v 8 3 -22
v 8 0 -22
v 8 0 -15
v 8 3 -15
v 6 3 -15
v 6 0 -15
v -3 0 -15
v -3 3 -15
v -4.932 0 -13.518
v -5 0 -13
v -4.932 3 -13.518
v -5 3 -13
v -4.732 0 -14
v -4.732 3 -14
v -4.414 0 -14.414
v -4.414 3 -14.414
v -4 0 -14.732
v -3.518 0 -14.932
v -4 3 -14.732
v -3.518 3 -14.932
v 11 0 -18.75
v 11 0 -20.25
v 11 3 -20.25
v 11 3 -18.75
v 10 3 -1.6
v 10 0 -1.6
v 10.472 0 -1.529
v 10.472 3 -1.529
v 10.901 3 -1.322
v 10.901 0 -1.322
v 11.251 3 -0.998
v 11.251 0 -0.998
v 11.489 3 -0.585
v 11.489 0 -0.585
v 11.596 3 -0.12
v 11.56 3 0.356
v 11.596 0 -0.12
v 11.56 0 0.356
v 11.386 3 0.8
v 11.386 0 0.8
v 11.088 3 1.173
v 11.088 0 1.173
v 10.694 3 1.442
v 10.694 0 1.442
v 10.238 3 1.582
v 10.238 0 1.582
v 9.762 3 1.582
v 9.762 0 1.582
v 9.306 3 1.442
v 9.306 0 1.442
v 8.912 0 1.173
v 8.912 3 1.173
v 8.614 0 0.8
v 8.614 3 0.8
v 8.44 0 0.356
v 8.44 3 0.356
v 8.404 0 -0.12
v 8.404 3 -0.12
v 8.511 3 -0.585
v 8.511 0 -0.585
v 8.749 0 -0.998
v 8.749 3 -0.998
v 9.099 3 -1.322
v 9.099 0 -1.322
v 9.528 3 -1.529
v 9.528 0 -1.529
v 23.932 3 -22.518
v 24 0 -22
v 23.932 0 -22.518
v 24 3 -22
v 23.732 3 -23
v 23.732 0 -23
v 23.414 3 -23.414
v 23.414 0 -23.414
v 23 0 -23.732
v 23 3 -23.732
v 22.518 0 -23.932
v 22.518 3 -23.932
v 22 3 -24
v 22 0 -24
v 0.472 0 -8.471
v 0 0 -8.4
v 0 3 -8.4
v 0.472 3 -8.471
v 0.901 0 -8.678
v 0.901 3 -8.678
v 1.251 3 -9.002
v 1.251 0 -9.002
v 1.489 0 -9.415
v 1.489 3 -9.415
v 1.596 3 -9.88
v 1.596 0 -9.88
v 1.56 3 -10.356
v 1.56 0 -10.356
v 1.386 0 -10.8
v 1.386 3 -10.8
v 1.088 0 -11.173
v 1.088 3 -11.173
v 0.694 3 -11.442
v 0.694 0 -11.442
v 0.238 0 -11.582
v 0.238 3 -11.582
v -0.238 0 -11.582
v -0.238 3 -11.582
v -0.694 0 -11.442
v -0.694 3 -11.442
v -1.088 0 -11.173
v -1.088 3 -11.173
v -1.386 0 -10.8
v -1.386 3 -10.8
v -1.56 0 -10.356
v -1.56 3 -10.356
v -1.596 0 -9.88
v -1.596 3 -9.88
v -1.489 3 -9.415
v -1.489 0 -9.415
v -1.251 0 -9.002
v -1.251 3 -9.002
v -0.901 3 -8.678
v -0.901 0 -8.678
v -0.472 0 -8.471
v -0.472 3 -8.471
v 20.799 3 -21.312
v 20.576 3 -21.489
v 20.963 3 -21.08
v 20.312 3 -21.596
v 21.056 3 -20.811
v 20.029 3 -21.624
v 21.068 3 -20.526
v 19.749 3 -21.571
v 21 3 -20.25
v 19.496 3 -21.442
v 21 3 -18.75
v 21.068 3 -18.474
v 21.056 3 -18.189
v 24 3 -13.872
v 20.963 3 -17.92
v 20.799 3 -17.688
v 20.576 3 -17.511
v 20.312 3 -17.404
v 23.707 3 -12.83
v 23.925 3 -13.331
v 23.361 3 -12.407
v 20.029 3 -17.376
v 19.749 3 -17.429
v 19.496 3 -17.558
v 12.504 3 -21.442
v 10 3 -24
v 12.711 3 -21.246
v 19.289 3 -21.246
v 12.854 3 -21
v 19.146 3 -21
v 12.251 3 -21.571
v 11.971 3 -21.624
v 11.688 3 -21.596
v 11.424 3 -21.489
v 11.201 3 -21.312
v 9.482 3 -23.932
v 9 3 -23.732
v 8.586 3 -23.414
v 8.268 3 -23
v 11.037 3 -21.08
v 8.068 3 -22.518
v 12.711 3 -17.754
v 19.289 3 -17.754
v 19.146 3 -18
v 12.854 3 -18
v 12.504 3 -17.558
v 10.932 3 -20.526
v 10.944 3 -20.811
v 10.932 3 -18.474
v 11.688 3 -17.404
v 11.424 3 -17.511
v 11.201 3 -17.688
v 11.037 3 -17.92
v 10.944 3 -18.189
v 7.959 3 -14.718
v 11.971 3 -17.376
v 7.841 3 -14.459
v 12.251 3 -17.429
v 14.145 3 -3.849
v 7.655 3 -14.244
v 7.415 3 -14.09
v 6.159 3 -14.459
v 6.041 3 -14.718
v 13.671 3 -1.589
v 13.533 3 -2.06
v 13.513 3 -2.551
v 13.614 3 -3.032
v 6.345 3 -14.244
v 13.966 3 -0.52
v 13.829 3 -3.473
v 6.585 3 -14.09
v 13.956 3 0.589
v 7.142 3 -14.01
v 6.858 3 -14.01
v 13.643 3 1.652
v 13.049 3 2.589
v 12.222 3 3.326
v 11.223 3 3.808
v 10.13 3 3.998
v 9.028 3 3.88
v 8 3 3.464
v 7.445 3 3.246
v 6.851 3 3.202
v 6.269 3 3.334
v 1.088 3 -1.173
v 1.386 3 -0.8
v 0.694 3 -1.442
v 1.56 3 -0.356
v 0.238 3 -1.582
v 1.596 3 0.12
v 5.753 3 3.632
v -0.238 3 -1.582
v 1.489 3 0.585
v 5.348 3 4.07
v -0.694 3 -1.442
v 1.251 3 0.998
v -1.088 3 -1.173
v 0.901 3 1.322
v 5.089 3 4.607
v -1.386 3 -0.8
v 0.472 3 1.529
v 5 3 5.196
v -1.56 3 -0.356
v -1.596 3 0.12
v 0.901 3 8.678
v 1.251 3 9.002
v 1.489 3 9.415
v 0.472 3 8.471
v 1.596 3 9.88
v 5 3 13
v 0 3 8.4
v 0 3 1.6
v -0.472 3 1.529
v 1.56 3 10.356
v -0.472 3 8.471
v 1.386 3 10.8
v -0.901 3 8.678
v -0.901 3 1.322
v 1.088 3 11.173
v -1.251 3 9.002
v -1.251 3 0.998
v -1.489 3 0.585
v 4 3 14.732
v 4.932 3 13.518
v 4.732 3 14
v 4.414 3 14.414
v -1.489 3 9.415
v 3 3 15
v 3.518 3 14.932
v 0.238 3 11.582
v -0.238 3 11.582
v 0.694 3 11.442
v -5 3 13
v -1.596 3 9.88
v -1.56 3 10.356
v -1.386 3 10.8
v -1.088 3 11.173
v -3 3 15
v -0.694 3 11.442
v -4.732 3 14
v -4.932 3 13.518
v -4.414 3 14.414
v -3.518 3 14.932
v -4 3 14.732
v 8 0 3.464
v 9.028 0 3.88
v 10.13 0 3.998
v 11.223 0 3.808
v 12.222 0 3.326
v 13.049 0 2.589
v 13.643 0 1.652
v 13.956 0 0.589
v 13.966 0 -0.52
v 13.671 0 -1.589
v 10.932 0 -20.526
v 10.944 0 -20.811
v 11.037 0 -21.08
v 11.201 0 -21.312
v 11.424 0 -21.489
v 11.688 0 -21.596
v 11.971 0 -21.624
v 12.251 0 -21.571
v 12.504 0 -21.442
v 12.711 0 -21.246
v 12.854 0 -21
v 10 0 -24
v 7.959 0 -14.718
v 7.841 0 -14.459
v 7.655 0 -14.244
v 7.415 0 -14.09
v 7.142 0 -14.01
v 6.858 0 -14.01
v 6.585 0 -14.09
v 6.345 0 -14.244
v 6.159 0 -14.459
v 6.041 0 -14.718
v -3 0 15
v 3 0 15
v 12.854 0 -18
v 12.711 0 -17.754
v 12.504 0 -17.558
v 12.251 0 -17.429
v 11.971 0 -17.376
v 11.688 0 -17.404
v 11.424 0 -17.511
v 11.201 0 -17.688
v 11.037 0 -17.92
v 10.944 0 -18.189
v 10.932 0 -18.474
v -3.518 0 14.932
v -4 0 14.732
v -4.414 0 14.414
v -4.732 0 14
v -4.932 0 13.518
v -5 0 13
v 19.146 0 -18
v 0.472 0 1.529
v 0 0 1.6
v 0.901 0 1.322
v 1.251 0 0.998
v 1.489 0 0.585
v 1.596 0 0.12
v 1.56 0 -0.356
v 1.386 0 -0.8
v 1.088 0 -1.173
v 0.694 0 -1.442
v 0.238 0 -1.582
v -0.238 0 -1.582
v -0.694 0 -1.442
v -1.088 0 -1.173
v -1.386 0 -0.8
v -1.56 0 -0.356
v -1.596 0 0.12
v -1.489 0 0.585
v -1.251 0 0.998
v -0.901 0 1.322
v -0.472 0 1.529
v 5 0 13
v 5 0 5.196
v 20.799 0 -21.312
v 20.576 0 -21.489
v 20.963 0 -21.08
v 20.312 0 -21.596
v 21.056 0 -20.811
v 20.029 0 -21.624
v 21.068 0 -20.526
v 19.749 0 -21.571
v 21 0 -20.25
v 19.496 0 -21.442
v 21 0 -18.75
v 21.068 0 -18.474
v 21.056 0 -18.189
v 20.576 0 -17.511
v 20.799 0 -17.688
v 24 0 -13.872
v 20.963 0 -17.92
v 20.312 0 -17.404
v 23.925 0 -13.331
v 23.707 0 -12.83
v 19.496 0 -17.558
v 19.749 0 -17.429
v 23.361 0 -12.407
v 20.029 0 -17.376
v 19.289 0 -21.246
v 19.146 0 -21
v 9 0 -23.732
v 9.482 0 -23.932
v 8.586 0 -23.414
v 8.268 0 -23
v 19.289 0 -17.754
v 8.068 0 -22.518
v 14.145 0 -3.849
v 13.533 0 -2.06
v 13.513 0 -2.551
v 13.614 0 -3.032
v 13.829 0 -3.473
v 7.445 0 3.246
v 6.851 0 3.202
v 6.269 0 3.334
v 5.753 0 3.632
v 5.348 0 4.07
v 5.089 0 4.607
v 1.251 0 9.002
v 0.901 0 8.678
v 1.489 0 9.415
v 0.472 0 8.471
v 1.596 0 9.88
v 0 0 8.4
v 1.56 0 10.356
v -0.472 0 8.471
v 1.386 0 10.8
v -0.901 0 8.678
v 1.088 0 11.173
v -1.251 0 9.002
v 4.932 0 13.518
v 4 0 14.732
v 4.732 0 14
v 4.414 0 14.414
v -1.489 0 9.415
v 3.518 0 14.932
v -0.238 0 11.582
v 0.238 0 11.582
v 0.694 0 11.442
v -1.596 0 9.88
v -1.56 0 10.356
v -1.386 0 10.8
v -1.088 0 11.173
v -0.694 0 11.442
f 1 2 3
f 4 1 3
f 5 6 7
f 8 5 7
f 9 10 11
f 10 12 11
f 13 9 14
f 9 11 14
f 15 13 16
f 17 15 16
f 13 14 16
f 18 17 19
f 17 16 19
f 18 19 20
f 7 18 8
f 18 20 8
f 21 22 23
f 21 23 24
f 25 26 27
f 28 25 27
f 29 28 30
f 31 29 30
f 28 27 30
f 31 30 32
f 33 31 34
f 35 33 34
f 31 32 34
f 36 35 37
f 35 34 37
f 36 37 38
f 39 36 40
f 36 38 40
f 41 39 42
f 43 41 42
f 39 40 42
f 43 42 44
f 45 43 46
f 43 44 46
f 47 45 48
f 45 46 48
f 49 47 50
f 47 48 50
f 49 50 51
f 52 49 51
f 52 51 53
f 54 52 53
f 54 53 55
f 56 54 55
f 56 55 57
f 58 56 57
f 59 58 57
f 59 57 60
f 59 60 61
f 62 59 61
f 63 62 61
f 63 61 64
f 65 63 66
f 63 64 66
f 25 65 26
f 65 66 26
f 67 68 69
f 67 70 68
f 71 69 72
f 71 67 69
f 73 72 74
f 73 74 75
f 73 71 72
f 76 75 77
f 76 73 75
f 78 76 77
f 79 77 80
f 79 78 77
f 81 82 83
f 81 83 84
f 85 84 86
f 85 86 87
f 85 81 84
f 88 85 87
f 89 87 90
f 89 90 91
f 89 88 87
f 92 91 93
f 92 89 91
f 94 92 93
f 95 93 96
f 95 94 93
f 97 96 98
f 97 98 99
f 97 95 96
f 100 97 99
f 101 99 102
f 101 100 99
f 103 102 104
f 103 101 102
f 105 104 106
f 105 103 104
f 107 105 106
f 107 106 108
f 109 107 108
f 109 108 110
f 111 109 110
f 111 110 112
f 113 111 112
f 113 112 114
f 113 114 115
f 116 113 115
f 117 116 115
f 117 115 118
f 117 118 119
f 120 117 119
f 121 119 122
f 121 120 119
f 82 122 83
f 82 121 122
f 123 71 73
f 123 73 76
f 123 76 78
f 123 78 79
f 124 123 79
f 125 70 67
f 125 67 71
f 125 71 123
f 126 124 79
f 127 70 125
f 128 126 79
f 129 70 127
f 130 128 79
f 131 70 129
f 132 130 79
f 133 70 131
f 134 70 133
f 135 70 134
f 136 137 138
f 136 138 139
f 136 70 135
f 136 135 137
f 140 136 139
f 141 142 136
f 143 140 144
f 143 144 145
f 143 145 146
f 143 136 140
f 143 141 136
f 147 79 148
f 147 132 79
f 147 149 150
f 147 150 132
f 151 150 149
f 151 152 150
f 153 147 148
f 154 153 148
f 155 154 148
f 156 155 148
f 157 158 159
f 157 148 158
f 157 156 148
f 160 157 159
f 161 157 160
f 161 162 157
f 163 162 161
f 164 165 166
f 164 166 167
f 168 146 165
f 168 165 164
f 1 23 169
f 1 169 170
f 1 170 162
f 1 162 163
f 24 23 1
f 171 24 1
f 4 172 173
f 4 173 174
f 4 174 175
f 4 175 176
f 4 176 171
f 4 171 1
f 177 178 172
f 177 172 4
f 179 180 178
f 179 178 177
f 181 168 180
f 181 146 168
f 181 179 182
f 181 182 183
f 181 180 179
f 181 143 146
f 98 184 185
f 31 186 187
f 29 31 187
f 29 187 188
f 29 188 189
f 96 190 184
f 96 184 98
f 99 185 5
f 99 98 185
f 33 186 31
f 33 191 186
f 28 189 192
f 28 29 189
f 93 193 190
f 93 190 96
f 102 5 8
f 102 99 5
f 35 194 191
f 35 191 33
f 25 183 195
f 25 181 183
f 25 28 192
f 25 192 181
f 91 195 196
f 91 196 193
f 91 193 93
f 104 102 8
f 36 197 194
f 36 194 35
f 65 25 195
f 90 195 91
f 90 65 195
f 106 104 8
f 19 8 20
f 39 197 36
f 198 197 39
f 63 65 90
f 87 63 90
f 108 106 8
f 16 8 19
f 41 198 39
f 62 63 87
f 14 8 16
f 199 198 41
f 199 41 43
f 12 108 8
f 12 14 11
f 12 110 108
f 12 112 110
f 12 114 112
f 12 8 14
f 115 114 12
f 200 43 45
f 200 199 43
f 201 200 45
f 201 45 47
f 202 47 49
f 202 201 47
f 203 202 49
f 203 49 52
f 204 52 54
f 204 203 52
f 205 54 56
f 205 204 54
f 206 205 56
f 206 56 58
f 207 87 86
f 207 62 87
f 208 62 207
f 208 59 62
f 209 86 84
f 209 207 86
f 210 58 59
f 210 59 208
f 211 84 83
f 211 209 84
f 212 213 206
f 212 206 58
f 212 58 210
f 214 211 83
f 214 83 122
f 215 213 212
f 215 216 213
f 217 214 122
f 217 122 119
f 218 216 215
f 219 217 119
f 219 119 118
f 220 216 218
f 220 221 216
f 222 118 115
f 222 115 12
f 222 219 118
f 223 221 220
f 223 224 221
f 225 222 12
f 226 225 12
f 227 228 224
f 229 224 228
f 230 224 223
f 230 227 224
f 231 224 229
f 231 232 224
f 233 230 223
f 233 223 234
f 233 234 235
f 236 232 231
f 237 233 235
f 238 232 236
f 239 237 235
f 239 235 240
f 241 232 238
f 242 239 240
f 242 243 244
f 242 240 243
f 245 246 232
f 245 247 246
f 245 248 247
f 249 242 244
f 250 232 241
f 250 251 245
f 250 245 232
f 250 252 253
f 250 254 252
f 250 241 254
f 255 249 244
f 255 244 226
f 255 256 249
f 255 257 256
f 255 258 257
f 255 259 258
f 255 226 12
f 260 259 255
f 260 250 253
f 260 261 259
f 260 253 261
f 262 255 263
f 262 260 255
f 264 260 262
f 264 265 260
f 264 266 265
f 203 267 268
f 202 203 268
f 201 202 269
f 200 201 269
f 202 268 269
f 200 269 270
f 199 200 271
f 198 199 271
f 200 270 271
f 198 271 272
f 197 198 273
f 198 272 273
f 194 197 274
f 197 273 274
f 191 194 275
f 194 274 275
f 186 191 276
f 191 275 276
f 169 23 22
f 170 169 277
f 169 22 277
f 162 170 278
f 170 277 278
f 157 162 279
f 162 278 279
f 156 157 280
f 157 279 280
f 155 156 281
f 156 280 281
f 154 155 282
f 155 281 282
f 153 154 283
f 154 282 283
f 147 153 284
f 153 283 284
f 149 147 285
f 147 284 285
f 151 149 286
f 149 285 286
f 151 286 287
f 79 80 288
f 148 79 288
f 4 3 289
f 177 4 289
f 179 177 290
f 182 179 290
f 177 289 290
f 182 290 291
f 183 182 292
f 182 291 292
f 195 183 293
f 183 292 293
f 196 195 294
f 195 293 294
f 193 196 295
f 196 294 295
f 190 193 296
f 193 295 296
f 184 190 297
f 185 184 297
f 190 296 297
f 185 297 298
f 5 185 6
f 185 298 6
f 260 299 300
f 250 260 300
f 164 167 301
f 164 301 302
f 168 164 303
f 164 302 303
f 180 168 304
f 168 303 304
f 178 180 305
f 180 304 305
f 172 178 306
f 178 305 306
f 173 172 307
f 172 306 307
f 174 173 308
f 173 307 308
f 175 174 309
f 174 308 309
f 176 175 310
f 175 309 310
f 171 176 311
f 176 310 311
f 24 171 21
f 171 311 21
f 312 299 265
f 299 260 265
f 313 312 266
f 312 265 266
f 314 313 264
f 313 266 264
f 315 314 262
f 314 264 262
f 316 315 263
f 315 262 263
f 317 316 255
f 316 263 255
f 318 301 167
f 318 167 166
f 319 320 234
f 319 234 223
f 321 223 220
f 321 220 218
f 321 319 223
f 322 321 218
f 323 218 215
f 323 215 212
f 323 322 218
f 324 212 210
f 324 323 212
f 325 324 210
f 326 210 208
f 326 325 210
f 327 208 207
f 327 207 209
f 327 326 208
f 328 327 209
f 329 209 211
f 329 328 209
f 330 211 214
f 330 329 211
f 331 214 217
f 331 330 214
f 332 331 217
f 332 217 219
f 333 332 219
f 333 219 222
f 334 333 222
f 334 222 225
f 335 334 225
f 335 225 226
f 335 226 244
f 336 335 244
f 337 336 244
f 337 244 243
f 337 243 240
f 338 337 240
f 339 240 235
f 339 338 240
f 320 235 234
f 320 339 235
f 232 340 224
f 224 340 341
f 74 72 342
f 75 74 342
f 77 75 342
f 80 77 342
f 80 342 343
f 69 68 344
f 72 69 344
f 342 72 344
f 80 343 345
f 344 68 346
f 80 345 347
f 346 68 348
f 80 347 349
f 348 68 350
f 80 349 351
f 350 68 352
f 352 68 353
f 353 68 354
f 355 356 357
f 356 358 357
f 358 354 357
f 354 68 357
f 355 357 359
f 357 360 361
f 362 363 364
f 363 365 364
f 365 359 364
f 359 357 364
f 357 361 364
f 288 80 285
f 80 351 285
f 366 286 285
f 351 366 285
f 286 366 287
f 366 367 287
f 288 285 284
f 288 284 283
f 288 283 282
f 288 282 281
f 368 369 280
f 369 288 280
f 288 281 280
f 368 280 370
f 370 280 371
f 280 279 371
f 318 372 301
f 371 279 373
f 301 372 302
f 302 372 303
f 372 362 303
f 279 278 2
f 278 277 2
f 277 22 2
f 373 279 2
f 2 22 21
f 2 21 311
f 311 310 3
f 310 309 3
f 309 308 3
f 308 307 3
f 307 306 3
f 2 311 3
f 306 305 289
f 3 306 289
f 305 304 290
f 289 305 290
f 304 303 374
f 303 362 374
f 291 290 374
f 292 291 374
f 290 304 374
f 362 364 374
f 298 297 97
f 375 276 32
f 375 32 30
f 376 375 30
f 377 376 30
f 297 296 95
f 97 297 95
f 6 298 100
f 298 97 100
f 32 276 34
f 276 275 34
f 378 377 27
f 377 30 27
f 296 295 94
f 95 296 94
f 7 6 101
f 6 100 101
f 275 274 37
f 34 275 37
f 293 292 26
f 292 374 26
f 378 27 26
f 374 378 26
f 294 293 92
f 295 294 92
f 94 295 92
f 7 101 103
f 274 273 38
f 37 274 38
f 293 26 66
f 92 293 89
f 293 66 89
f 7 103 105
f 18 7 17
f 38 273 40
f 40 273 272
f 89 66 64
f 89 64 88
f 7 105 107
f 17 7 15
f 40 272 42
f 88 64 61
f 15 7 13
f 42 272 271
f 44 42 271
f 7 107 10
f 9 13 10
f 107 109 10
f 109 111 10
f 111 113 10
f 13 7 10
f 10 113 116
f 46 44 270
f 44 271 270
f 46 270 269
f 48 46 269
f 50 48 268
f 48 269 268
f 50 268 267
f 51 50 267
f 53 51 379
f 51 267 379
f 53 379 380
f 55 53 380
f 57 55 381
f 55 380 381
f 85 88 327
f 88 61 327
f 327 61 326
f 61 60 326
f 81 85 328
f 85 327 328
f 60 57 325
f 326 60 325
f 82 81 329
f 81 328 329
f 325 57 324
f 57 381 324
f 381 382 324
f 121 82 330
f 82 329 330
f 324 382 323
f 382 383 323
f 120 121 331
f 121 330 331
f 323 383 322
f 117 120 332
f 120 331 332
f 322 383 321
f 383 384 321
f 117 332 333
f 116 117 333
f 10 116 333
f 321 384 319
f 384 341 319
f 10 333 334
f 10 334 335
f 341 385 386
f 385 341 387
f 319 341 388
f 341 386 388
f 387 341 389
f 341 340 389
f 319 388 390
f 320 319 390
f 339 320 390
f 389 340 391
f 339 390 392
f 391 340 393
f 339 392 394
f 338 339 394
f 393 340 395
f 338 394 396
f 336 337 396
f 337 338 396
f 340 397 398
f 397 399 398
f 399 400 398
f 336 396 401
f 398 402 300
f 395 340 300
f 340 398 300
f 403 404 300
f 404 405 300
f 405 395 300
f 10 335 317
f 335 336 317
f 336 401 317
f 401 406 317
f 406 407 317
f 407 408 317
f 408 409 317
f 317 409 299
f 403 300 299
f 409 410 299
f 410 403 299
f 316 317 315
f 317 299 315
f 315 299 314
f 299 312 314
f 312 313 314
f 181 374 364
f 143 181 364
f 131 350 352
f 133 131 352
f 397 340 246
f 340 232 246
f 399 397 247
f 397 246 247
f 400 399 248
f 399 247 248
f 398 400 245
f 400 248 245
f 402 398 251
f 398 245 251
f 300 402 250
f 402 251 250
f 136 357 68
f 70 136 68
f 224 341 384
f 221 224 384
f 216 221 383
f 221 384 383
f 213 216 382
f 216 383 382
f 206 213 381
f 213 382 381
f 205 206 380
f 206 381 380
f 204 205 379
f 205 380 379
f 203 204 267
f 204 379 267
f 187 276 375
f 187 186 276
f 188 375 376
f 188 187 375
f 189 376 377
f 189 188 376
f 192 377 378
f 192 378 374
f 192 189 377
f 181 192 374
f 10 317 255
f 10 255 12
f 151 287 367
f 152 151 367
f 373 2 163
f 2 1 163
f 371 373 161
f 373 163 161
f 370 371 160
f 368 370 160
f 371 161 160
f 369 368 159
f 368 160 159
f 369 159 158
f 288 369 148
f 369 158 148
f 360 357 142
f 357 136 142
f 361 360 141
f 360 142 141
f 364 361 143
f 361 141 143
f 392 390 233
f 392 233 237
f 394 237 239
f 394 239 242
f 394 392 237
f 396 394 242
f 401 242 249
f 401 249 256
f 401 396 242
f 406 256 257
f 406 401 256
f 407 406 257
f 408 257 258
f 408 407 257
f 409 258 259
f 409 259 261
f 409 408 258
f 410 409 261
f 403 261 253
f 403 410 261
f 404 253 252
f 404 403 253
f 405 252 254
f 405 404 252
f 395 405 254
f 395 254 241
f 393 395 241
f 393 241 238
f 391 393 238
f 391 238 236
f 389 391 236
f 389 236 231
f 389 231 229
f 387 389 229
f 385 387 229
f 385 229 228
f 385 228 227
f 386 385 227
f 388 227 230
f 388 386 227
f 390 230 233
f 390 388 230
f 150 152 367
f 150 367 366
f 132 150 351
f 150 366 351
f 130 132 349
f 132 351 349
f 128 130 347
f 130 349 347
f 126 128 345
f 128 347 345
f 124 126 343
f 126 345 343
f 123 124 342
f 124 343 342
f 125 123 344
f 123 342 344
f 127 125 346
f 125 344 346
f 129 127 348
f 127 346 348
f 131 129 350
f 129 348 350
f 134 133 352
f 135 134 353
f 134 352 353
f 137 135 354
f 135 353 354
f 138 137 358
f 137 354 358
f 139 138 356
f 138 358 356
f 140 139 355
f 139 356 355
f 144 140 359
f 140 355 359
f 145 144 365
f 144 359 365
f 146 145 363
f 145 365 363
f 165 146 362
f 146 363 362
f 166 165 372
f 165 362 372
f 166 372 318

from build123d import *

# Parameters (mm, degrees)
SKETCH_1_W          = 10
SKETCH_1_H          = 30
SKETCH_1_R          = 1.6
EXTRUDE_1_DEPTH     = 3
SKETCH_5_R          = 1.6
SKETCH_5_W          = 10
SKETCH_5_H          = 3
EXTRUDE_4_DEPTH     = 3
SKETCH_6_R          = 1
CUT_EXTRUDE_1_DEPTH = 35.073450075
FILLET_1_R          = 2


with BuildPart() as part:
    # 草图1 → 凸台-拉伸1 (new body)
    with BuildSketch(Plane(origin=(0, 0, 0), x_dir=(1, 0, 0), z_dir=(0, 1, 0))):
        Rectangle(SKETCH_1_W, SKETCH_1_H)
        with Locations(Location((0, 0, 0), (0, 0, 270))):
            Circle(SKETCH_1_R, mode=Mode.SUBTRACT)
        with Locations(Location((0, 10, 0), (0, 0, 270))):
            Circle(SKETCH_1_R, mode=Mode.SUBTRACT)
        with Locations(Location((0, -10, 0), (0, 0, 90))):
            Circle(SKETCH_1_R, mode=Mode.SUBTRACT)
    extrude(amount=EXTRUDE_1_DEPTH)

    # 草图5 → 凸台-拉伸4 (add)
    with BuildSketch(Plane.XZ):
        with BuildLine():
            Line((24, -13), (24, -24))
            Line((24, -24), (8, -24))
            Line((8, -24), (8, -15))
            Line((8, -15), (5, -15))
            Line((5, -15), (5, 5.196152423))
            ThreePointArc((5, 5.196152423), (6, 3.464101615), (8, 3.464101615))
            ThreePointArc((8, 3.464101615), (13.127799472, 2.493365288), (12.931173967, -2.721804397))
            Line((12.931173967, -2.721804397), (24, -13))
        make_face()
        with Locations(Location((10, 0, 0), (0, 0, 270))):
            Circle(SKETCH_5_R, mode=Mode.SUBTRACT)
        with Locations((16, -19.5)):
            Rectangle(SKETCH_5_W, SKETCH_5_H, mode=Mode.SUBTRACT)
    extrude(amount=-EXTRUDE_4_DEPTH)

    # 草图6 → 切除-拉伸1 (cut, through all)
    with BuildSketch(Plane.XZ):
        with Locations((20.072975189, -18.375)):
            Circle(SKETCH_6_R)
        with Locations((11.927024811, -18.375)):
            Circle(SKETCH_6_R)
        with Locations((11.927024811, -20.625)):
            Circle(SKETCH_6_R)
        with Locations((20.072975189, -20.625)):
            Circle(SKETCH_6_R)
        with Locations((7, -15)):
            Circle(SKETCH_6_R)
    extrude(amount=-CUT_EXTRUDE_1_DEPTH, mode=Mode.SUBTRACT)

    # 圆角1
    fillet_1_edges = [part.edges().sort_by_distance(p)[0] for p in [
        (8, 1.5, -24),
        (24, 1.5, -24),
        (24, 1.5, -13),
        (12.931173967, 1.5, -2.721804397),
        (5, 1.5, 15),
        (-5, 1.5, 15),
        (-5, 1.5, -15),
    ]]
    fillet(fillet_1_edges, radius=FILLET_1_R)


solid = part.part
